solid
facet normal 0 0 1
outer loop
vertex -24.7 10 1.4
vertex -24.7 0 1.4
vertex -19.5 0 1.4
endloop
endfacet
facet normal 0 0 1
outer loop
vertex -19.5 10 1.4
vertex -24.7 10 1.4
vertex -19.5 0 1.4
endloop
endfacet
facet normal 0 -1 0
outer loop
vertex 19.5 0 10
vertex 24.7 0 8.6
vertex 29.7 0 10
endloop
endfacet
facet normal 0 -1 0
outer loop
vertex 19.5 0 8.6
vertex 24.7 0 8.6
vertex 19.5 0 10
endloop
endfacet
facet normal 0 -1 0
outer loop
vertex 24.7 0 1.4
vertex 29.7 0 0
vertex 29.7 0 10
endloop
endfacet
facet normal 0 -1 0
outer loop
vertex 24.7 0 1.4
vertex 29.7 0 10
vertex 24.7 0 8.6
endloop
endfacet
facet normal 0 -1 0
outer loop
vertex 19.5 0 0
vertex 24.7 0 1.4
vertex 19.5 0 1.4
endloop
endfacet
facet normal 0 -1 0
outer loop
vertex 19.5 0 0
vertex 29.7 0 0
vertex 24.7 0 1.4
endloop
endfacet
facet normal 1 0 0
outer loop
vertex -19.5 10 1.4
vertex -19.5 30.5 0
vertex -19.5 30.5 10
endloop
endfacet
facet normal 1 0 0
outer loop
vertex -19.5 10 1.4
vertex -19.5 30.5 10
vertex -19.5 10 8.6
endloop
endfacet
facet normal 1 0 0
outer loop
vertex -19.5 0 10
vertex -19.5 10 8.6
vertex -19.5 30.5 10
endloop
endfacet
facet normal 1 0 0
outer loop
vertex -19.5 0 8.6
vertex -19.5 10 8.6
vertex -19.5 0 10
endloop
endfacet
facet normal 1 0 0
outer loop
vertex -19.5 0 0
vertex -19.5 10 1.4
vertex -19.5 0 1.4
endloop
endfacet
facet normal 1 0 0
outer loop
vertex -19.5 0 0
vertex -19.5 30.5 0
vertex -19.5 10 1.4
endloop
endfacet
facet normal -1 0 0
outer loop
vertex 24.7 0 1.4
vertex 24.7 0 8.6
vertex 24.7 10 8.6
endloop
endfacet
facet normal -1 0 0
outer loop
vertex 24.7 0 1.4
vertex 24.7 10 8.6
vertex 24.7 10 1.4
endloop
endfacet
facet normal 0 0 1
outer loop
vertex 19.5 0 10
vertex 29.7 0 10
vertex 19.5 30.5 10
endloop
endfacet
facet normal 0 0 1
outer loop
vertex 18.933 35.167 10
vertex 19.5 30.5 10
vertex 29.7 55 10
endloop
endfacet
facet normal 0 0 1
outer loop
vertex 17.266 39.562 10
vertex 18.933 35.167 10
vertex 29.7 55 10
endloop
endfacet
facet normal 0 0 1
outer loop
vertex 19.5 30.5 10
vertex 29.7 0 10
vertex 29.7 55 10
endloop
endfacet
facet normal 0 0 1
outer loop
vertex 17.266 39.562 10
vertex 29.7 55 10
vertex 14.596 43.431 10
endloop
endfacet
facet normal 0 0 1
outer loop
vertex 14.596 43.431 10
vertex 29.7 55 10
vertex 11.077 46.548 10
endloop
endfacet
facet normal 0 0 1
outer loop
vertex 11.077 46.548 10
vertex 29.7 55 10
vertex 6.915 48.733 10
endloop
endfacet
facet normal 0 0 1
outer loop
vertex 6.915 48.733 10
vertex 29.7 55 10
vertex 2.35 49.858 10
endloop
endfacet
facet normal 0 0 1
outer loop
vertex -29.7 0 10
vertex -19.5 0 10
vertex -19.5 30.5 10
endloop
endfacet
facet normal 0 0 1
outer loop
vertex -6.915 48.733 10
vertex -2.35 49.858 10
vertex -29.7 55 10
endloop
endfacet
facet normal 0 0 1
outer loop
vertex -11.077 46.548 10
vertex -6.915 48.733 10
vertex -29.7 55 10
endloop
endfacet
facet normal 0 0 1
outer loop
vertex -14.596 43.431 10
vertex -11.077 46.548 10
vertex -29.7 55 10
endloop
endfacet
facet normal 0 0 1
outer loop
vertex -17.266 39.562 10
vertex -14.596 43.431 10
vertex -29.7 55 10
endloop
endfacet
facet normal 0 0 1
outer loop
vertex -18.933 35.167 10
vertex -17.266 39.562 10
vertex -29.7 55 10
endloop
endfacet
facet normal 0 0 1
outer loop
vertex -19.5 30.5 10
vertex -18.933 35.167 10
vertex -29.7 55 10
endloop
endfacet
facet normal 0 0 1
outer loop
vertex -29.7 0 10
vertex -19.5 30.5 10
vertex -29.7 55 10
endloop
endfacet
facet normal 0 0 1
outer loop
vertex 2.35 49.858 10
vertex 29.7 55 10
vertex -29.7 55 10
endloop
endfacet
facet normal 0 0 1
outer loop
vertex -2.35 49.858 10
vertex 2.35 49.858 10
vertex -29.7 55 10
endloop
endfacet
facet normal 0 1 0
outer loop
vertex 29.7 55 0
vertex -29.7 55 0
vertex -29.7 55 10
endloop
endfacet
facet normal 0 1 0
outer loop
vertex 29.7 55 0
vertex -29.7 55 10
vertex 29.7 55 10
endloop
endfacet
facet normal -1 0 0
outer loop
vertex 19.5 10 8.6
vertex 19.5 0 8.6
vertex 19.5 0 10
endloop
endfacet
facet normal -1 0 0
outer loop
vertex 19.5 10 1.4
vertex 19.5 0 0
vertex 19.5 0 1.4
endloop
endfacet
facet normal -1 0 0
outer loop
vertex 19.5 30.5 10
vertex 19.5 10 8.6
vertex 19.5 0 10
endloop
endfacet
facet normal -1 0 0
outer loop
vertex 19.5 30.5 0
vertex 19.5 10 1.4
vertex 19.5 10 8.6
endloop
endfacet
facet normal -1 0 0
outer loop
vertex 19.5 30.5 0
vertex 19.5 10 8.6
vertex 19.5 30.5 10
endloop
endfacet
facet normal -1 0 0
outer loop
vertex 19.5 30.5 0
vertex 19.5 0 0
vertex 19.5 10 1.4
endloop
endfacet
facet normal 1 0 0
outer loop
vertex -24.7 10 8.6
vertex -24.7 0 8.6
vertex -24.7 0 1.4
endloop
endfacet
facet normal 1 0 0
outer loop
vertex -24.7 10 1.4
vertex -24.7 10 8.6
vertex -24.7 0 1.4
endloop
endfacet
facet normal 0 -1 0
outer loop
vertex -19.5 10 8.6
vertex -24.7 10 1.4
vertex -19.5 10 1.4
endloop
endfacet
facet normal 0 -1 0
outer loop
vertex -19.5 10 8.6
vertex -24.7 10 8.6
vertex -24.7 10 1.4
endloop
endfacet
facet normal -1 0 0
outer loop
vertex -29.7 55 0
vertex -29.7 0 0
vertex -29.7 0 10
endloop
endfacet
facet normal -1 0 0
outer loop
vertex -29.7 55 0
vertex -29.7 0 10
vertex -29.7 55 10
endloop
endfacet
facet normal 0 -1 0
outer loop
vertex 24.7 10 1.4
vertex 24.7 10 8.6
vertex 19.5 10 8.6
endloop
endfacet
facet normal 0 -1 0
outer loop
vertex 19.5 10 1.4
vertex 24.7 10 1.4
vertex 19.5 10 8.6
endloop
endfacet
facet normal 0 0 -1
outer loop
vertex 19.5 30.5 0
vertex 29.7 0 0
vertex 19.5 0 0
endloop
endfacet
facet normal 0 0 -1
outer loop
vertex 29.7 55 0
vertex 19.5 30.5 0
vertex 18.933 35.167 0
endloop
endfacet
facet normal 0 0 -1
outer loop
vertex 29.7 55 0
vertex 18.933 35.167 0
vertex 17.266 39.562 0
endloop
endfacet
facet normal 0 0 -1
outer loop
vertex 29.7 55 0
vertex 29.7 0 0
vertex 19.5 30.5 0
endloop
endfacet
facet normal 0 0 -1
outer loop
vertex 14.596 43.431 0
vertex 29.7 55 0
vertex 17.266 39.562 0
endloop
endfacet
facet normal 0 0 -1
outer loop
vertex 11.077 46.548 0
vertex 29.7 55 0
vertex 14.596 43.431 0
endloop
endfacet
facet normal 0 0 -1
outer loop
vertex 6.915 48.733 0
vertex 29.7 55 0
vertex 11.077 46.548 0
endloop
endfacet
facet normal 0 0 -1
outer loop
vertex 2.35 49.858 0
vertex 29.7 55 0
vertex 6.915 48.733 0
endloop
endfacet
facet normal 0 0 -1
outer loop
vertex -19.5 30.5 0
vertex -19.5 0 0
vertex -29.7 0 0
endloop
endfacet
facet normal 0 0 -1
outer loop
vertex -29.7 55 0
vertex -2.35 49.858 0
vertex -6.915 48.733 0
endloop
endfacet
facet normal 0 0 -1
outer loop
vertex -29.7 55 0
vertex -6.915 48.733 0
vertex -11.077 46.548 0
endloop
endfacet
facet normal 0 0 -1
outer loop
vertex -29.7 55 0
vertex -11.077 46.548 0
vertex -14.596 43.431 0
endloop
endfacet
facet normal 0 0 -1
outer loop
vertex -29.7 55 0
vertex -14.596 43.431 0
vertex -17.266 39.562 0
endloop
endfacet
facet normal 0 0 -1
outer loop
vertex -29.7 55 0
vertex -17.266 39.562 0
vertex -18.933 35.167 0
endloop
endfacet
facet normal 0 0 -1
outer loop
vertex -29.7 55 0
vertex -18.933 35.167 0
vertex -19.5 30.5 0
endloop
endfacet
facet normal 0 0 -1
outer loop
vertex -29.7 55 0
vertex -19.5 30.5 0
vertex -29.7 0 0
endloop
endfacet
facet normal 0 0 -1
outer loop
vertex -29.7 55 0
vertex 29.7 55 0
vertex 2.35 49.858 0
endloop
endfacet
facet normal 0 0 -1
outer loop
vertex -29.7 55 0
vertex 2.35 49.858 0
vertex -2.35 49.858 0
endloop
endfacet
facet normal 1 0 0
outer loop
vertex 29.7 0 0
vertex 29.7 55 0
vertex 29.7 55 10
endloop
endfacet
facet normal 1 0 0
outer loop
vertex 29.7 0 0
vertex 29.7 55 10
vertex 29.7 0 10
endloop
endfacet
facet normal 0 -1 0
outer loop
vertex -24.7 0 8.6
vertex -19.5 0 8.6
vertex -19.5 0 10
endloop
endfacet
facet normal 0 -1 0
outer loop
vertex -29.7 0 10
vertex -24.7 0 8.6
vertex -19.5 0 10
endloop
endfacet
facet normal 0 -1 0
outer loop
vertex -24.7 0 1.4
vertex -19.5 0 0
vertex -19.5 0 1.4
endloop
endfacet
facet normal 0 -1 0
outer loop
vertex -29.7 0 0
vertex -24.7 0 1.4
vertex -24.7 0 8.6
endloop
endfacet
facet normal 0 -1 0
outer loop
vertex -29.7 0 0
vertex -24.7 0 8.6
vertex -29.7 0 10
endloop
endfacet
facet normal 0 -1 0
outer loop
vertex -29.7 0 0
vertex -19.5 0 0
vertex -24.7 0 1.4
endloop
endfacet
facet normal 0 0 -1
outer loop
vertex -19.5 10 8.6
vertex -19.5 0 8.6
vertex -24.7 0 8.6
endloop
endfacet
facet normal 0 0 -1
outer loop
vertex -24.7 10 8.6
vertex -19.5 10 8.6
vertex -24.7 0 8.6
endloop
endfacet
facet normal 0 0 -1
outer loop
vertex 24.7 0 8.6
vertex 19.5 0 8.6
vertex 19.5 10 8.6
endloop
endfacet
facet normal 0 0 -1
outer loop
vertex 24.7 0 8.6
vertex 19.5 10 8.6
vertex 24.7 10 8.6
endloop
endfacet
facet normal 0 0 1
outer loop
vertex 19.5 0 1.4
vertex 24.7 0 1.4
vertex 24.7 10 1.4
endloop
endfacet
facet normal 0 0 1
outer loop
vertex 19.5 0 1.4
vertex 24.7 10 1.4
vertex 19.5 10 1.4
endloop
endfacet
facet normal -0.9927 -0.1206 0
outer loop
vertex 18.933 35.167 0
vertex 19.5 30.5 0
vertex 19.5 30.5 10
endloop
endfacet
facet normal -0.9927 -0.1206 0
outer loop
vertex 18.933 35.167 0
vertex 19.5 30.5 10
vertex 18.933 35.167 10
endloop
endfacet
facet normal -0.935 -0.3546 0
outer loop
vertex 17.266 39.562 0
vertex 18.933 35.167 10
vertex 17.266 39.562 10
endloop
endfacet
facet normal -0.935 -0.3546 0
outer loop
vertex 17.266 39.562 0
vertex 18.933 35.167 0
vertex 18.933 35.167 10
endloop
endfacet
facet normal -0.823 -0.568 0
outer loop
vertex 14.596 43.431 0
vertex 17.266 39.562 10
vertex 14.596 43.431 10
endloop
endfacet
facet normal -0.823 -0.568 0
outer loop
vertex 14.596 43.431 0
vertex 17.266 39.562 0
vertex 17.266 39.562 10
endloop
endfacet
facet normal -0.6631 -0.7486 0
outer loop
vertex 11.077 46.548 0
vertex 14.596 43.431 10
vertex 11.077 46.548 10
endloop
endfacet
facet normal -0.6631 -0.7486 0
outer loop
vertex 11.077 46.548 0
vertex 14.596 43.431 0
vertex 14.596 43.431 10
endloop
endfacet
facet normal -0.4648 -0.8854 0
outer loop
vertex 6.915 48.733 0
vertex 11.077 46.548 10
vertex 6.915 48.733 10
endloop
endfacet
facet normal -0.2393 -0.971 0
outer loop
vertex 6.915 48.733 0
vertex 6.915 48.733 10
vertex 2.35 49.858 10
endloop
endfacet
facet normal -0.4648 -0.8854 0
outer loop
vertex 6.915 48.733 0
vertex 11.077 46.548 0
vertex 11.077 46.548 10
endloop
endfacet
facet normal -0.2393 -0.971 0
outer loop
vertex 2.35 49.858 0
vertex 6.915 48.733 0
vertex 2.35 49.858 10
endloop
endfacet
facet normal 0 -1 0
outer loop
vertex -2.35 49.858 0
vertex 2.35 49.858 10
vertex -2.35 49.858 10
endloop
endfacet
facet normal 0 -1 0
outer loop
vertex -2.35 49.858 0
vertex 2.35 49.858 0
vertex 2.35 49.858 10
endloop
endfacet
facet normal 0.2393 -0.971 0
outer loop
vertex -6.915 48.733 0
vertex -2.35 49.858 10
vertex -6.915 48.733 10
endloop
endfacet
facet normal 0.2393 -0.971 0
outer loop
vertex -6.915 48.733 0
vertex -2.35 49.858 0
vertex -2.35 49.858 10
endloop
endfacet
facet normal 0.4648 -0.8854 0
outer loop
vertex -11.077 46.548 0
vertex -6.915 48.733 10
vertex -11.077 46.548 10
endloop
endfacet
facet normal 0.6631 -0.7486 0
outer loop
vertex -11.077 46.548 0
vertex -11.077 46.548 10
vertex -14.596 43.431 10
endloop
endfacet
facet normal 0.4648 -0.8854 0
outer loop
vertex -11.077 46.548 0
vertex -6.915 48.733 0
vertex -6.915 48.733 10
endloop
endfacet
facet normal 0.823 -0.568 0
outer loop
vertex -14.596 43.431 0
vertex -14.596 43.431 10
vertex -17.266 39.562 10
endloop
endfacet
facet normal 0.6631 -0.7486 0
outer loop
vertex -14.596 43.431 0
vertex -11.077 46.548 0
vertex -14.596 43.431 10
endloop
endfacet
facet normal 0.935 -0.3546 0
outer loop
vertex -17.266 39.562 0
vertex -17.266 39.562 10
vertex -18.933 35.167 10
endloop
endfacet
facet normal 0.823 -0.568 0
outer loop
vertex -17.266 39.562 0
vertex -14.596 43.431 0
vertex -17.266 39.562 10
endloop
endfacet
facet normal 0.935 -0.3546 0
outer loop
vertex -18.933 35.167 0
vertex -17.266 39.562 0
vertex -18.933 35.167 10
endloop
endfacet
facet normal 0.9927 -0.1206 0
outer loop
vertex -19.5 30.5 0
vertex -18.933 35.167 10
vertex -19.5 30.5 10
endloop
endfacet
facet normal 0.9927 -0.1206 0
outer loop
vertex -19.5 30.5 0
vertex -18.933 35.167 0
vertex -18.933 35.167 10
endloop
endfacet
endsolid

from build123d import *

# Parameters (mm, degrees)
SALIENTE_EXTRUIR1_DEPTH = 10
CORTAR_EXTRUIR1_DEPTH   = 10


with BuildPart() as part:
    # Croquis2 → Saliente-Extruir1 (new body)
    with BuildSketch(Plane.XY):
        with BuildLine():
            Line((-19.5, 0), (-29.7, 0))
            Line((-29.7, 0), (-29.7, 55))
            Line((-29.7, 55), (29.7, 55))
            Line((29.7, 55), (29.7, 0))
            Line((29.7, 0), (19.5, 0))
            Line((19.5, 0), (19.5, 30.5))
            ThreePointArc((19.5, 30.5), (0, 50), (-19.5, 30.5))
            Line((-19.5, 30.5), (-19.5, 0))
        make_face()
    extrude(amount=SALIENTE_EXTRUIR1_DEPTH)

    # Croquis3 → Cortar-Extruir1 (cut)
    with BuildSketch(Plane.XZ):
        Polygon((19.5, 5), (19.5, 8.6), (24.7, 8.6), (24.7, 1.4), (19.5, 1.4), align=None)
        Polygon((-24.7, 1.4), (-19.5, 1.4), (-19.5, 5), (-19.5, 8.6), (-24.7, 8.6), align=None)
    extrude(amount=-CORTAR_EXTRUIR1_DEPTH, mode=Mode.SUBTRACT)


solid = part.part
